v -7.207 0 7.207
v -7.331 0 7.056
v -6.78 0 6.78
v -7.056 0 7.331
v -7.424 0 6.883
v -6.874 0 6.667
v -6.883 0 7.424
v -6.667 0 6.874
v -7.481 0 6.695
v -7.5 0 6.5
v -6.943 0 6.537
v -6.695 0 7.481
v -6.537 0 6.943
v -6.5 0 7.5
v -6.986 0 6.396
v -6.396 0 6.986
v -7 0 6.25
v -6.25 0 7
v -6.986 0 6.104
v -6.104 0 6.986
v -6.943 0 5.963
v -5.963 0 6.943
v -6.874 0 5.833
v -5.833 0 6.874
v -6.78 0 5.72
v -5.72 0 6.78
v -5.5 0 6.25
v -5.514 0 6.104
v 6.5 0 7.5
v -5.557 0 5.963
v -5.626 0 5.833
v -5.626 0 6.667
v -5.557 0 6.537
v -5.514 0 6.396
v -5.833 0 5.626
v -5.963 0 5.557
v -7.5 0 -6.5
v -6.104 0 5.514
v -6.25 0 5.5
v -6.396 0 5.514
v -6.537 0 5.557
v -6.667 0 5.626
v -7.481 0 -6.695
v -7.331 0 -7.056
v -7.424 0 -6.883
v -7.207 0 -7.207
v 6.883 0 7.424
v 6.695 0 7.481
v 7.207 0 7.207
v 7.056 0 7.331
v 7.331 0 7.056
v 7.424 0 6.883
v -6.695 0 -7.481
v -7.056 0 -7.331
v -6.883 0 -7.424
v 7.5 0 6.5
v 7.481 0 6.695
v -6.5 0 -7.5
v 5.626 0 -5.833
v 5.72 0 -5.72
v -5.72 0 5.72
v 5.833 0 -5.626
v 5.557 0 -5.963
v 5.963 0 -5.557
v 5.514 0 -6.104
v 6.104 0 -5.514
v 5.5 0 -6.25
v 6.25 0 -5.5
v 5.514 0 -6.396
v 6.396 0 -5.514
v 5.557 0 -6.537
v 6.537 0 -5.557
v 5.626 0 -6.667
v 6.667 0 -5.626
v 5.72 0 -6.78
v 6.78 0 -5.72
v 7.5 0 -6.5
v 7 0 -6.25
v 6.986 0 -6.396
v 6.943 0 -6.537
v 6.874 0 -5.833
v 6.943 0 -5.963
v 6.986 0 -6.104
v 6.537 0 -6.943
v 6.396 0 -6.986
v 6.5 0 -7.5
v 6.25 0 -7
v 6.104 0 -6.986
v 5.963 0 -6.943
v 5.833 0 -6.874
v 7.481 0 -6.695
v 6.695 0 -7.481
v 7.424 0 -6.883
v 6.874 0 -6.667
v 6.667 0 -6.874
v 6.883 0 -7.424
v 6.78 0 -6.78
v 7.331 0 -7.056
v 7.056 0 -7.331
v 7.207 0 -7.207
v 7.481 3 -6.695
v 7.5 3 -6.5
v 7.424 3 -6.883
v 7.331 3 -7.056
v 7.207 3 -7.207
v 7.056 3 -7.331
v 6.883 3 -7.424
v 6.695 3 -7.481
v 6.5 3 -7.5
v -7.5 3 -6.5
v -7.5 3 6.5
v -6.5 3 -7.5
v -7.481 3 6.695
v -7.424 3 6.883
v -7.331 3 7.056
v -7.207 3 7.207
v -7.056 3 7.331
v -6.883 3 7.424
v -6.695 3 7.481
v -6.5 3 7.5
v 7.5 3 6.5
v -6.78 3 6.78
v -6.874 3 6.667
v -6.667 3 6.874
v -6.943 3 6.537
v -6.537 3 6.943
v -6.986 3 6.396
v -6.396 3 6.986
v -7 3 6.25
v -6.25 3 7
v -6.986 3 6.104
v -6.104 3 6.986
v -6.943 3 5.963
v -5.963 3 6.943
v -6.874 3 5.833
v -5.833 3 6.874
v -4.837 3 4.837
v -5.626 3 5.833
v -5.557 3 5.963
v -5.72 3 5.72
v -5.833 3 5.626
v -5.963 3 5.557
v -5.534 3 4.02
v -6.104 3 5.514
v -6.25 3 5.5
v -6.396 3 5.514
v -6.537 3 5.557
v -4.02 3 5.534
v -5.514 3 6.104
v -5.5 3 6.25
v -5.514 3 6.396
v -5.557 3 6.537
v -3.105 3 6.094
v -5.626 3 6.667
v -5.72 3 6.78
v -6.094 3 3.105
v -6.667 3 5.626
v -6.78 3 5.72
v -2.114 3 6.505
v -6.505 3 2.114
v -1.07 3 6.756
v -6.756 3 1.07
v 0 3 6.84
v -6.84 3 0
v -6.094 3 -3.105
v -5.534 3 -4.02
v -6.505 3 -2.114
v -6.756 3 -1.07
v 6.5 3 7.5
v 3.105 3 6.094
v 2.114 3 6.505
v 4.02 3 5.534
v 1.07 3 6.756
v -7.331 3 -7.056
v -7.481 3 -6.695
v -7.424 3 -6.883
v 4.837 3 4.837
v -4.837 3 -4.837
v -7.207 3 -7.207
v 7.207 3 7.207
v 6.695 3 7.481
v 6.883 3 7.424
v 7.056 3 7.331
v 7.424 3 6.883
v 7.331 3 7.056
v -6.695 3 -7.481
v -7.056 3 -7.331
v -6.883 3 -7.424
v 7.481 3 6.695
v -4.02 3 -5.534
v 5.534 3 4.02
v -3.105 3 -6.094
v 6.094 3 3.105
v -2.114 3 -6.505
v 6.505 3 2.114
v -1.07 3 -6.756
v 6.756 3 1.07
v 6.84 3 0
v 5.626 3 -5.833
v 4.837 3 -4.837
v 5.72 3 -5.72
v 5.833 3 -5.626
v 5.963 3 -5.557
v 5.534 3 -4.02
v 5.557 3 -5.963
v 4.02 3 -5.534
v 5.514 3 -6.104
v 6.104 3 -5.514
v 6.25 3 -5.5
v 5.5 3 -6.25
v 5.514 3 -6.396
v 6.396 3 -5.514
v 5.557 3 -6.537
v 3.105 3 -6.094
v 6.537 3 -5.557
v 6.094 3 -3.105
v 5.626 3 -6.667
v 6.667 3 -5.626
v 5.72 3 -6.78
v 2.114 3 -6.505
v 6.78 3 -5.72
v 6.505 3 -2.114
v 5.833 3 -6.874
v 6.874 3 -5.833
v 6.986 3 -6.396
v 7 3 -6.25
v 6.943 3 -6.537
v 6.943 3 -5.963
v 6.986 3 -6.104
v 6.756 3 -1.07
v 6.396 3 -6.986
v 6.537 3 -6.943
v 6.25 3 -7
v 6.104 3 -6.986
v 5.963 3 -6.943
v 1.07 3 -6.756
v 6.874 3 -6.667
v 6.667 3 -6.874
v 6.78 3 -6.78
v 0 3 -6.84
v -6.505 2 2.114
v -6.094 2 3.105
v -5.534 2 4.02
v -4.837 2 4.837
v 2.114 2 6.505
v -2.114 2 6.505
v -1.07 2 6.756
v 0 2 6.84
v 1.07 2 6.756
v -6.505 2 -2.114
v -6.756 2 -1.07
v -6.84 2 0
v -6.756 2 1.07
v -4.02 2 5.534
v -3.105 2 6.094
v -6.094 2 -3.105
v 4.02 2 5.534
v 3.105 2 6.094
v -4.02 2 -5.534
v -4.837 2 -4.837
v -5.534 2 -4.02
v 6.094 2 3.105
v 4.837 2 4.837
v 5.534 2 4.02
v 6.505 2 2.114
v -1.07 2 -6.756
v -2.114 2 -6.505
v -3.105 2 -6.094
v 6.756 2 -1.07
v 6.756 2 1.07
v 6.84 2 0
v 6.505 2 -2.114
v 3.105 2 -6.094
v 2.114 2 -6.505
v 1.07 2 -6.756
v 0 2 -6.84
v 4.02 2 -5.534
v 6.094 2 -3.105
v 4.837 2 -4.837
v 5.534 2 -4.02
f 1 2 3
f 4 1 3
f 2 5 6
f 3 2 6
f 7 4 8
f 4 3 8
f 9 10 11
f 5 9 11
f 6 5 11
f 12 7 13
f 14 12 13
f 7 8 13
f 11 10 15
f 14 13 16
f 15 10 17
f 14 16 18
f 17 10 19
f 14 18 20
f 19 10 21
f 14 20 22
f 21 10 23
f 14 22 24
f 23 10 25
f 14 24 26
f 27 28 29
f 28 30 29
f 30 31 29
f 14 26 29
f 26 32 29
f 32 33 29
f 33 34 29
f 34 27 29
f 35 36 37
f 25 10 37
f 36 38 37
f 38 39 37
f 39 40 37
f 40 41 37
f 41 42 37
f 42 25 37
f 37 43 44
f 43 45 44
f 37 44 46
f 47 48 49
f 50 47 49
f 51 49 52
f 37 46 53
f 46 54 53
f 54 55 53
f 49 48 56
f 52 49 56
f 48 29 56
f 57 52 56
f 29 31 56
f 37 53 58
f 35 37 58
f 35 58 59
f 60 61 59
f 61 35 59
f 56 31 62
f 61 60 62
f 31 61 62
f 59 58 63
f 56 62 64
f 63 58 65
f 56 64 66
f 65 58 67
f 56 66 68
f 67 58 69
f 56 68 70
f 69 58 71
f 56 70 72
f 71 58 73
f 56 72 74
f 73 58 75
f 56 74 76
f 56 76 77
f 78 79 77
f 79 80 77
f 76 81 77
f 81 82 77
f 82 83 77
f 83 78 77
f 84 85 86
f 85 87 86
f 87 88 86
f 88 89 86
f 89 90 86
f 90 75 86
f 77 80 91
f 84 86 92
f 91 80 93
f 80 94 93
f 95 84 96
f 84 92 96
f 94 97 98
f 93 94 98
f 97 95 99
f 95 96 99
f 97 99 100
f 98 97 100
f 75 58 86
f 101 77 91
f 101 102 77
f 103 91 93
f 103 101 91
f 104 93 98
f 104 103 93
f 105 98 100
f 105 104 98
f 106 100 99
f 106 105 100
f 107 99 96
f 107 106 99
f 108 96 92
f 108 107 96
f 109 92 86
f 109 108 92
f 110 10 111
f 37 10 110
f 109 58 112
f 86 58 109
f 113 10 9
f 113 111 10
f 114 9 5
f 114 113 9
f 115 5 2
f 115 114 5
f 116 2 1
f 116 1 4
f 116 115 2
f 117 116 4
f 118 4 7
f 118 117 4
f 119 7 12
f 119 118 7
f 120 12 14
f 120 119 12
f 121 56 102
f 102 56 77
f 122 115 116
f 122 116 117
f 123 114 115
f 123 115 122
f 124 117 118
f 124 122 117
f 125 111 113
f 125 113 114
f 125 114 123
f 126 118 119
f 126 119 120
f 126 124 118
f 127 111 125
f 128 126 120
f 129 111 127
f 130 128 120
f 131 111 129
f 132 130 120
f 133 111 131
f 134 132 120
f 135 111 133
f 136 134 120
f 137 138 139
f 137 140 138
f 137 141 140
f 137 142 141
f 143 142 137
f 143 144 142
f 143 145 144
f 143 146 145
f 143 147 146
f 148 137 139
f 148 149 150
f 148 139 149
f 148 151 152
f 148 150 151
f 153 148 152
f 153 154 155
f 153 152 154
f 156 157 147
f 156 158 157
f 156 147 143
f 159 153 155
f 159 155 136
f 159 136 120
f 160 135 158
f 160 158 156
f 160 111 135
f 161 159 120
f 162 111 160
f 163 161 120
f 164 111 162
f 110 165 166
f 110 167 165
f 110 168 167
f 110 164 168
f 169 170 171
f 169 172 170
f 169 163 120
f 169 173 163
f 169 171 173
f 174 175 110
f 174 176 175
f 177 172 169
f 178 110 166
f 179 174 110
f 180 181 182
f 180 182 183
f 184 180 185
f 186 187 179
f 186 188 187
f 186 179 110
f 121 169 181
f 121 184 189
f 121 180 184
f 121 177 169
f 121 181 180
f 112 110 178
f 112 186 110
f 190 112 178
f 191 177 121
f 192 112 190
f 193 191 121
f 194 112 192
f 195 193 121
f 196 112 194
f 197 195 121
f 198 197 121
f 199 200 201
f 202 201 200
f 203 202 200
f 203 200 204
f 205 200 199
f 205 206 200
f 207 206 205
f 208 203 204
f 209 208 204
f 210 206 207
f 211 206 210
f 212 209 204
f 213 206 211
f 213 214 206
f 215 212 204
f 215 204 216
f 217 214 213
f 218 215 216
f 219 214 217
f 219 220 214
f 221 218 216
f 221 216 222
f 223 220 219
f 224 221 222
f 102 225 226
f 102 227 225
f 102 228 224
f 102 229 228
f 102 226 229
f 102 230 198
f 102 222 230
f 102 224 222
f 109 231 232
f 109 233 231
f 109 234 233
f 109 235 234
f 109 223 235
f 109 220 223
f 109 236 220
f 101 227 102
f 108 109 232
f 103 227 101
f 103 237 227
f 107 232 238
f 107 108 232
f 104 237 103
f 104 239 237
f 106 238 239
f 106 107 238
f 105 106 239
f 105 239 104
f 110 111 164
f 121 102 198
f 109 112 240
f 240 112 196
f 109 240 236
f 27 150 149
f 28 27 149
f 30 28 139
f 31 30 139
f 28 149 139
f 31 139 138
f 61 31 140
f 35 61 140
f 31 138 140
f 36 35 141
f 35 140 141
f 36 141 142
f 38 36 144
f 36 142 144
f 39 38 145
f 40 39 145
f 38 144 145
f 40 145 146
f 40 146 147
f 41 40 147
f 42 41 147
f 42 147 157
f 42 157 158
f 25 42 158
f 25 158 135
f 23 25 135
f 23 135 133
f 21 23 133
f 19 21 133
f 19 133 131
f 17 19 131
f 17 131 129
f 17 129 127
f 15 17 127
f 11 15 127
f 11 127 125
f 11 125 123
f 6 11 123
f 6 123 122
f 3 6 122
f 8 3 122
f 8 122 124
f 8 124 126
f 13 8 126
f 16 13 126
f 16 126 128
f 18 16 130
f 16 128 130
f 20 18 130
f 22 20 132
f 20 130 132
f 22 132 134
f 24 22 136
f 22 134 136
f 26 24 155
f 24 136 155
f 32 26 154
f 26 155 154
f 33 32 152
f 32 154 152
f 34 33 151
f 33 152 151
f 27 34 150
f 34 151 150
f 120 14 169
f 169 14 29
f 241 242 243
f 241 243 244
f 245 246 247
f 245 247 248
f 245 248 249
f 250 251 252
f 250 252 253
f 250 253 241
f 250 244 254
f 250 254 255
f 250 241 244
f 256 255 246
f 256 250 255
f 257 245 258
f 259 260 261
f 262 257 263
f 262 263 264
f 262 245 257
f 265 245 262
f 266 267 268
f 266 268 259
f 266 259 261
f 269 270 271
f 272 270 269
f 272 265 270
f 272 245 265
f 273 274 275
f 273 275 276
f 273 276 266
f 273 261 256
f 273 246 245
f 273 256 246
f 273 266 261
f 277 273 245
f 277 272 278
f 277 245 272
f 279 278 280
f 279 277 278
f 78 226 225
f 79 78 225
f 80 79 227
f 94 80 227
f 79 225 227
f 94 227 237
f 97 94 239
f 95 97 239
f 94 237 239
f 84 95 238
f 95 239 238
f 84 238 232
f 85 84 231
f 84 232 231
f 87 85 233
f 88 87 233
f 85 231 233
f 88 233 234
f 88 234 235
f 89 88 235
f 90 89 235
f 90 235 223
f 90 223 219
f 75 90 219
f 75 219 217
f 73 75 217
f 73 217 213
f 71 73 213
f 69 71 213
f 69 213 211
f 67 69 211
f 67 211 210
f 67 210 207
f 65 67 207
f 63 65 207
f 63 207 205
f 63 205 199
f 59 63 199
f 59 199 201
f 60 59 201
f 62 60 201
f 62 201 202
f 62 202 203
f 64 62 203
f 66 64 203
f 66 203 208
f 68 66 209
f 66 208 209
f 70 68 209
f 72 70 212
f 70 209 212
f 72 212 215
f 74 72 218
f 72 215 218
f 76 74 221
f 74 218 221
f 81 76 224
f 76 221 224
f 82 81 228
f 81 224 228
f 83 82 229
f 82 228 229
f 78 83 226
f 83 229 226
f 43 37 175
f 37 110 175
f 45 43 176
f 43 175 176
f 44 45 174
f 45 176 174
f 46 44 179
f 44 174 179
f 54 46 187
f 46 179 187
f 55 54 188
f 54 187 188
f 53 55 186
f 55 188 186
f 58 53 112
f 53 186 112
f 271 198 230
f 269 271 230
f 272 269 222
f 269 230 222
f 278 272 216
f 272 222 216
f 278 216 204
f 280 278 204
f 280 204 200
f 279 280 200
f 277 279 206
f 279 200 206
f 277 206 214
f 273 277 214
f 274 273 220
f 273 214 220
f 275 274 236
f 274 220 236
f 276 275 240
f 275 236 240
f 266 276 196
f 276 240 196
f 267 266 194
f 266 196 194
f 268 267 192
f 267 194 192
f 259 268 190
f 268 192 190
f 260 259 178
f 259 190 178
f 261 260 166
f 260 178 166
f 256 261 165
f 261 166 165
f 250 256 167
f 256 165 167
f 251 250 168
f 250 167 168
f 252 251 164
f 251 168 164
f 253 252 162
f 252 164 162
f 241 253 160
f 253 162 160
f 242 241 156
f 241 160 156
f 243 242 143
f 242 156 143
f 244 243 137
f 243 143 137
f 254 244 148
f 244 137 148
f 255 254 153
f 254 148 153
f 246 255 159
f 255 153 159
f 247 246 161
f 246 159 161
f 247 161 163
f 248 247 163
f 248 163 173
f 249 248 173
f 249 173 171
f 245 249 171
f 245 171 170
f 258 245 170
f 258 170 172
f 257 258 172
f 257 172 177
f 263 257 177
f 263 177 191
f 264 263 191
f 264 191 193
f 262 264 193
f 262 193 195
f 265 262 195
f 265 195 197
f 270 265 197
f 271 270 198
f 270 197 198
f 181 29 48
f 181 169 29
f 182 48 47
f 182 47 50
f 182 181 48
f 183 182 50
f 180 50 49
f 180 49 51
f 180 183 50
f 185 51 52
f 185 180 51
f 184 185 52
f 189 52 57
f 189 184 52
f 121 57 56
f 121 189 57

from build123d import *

# Parameters (mm, degrees)
SKETCH_1_W          = 15
SKETCH_1_H          = 15
EXTRUDE_1_DEPTH     = 3
FILLET_1_R          = 1
SKETCH_2_R          = 0.75
CUT_EXTRUDE_1_DEPTH = 4
SKETCH_3_R          = 6.839868167
CUT_EXTRUDE_2_DEPTH = 1


with BuildPart() as part:
    # 草图1 → 凸台-拉伸1 (new body)
    with BuildSketch(Plane(origin=(0, 0, 0), x_dir=(1, 0, 0), z_dir=(0, 1, 0))):
        Rectangle(SKETCH_1_W, SKETCH_1_H)
    extrude(amount=EXTRUDE_1_DEPTH)

    # 圆角1
    fillet_1_edges = [part.edges().sort_by_distance(p)[0] for p in [
        (-7.5, 1.5, -7.5),
        (7.5, 1.5, -7.5),
        (7.5, 1.5, 7.5),
        (-7.5, 1.5, 7.5),
    ]]
    fillet(fillet_1_edges, radius=FILLET_1_R)

    # 草图2 → 切除-拉伸1 (cut, through all)
    with BuildSketch(Plane(origin=(0, 3, 0), x_dir=(1, 0, 0), z_dir=(0, 1, 0))):
        with Locations((-6.25, -6.25)):
            Circle(SKETCH_2_R)
        with Locations((6.25, 6.25)):
            Circle(SKETCH_2_R)
    extrude(amount=-CUT_EXTRUDE_1_DEPTH, mode=Mode.SUBTRACT)

    # 草图3 → 切除-拉伸2 (cut)
    with BuildSketch(Plane(origin=(0, 3, 0), x_dir=(1, 0, 0), z_dir=(0, 1, 0))):
        Circle(SKETCH_3_R)
    extrude(amount=-CUT_EXTRUDE_2_DEPTH, mode=Mode.SUBTRACT)


solid = part.part
